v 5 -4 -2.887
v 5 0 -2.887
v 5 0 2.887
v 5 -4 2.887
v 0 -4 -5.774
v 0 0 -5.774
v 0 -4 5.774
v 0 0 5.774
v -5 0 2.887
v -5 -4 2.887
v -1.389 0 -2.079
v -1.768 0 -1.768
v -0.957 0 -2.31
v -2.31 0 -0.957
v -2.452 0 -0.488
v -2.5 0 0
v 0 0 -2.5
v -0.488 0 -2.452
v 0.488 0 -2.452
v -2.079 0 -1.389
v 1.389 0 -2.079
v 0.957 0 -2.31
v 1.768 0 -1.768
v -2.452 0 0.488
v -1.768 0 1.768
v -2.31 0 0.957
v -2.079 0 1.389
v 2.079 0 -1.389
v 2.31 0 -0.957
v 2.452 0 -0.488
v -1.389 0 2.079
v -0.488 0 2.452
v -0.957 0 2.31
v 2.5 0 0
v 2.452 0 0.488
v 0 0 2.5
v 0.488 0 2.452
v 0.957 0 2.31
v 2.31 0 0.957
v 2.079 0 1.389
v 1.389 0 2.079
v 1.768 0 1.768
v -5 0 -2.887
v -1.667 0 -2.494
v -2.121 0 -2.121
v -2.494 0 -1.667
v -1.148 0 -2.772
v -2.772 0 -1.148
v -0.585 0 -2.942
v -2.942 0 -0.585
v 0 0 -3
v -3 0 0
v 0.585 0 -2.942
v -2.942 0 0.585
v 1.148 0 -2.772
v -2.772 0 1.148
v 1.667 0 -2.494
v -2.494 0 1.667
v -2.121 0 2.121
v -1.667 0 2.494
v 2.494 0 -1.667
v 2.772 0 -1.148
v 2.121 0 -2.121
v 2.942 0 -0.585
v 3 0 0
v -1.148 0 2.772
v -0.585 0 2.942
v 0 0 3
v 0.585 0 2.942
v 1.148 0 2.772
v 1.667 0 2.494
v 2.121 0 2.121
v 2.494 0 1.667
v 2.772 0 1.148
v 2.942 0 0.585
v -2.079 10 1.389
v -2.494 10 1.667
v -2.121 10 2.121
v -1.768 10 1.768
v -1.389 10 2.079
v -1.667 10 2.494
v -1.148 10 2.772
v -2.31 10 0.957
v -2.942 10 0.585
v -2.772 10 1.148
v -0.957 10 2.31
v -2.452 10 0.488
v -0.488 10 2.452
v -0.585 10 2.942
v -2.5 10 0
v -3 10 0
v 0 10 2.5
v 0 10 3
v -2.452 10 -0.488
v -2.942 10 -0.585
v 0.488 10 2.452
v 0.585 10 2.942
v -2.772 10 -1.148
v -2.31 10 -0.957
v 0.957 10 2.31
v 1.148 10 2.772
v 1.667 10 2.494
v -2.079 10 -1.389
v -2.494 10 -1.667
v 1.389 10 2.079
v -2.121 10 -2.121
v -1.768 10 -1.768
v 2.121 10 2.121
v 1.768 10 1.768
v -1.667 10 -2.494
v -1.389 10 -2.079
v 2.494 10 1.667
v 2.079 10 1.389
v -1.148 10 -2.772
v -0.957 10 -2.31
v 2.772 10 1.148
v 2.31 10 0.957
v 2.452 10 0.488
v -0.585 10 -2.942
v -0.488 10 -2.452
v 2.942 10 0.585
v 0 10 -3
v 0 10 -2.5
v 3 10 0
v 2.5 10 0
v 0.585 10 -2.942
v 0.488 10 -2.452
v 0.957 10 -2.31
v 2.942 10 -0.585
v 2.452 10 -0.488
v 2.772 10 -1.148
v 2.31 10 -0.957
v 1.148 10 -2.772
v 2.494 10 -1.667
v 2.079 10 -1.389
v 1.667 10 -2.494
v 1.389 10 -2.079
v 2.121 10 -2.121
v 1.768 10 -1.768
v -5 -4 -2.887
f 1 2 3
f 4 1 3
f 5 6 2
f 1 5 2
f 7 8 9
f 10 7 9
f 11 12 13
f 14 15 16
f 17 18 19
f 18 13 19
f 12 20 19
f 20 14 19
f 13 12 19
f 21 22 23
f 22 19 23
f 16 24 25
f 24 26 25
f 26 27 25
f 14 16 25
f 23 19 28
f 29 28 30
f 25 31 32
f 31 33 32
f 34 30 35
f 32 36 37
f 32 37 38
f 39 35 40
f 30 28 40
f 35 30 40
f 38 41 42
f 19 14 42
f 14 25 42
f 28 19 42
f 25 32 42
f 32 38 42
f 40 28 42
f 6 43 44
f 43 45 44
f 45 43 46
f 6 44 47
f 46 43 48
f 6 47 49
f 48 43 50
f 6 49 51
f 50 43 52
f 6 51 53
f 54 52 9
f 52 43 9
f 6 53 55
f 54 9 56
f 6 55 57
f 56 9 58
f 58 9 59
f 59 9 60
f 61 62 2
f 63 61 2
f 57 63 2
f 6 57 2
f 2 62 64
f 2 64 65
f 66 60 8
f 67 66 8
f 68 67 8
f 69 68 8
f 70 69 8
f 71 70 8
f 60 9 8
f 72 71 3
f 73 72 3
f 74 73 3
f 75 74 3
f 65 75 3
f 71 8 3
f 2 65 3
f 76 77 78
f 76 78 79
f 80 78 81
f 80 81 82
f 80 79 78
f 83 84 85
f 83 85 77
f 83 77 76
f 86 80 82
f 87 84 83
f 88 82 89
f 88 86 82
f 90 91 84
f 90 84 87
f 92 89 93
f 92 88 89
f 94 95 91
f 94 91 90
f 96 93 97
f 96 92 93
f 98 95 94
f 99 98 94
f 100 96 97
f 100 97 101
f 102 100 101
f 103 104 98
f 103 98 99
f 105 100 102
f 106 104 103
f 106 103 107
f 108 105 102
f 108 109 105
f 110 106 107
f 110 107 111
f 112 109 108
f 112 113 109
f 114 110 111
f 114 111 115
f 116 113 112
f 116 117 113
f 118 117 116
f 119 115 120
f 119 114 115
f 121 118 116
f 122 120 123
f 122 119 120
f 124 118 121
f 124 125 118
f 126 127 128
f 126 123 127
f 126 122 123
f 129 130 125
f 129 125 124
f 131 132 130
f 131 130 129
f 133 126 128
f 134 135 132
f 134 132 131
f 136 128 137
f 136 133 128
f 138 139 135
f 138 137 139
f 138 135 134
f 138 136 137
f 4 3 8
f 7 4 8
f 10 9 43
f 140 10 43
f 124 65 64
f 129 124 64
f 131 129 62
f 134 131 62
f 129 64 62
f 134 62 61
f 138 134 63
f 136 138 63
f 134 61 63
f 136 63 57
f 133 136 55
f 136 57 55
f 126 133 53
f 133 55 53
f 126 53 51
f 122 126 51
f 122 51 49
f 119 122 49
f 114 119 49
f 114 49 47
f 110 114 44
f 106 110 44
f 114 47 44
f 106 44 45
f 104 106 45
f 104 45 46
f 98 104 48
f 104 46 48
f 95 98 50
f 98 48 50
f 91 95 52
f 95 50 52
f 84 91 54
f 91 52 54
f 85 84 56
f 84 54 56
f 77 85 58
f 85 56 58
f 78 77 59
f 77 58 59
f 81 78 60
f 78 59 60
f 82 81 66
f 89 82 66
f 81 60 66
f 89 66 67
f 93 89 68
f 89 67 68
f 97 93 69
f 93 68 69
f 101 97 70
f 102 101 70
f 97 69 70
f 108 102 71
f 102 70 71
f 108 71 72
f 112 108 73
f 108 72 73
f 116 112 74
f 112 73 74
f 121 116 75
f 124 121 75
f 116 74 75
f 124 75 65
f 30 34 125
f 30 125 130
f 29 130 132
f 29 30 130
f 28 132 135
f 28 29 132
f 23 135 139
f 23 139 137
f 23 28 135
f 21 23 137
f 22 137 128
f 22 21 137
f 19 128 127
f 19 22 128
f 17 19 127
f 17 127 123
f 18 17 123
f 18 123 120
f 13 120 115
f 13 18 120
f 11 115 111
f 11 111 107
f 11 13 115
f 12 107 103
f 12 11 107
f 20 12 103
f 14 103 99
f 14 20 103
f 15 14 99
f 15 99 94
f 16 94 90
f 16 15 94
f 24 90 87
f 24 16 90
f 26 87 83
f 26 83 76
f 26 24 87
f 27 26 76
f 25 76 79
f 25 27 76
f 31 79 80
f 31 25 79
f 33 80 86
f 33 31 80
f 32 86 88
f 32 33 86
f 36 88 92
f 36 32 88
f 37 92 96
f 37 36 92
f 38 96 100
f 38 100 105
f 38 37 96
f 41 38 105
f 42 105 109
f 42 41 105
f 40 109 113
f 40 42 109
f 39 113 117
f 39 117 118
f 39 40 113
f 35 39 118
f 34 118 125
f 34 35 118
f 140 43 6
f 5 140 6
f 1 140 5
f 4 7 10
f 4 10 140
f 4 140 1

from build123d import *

# Parameters (mm, degrees)
SKETCH1_R           = 3
SKETCH1_R_2         = 2.5
BOSS_EXTRUDE1_DEPTH = 10
BOSS_EXTRUDE2_DEPTH = 4


with BuildPart() as part:
    # Sketch1 → Boss-Extrude1 (new body)
    with BuildSketch(Plane(origin=(0, 0, 0), x_dir=(1, 0, 0), z_dir=(0, 1, 0))):
        Circle(SKETCH1_R)
        Circle(SKETCH1_R_2, mode=Mode.SUBTRACT)
    extrude(amount=BOSS_EXTRUDE1_DEPTH)

    # Sketch2 → Boss-Extrude2 (add)
    with BuildSketch(Plane.XZ):
        Polygon((0, 5.773502692), (-5, 2.886751346), (-5, -2.886751346), (0, -5.773502692), (5, -2.886751346), (5, 2.886751346), align=None)
    extrude(amount=BOSS_EXTRUDE2_DEPTH)


solid = part.part
